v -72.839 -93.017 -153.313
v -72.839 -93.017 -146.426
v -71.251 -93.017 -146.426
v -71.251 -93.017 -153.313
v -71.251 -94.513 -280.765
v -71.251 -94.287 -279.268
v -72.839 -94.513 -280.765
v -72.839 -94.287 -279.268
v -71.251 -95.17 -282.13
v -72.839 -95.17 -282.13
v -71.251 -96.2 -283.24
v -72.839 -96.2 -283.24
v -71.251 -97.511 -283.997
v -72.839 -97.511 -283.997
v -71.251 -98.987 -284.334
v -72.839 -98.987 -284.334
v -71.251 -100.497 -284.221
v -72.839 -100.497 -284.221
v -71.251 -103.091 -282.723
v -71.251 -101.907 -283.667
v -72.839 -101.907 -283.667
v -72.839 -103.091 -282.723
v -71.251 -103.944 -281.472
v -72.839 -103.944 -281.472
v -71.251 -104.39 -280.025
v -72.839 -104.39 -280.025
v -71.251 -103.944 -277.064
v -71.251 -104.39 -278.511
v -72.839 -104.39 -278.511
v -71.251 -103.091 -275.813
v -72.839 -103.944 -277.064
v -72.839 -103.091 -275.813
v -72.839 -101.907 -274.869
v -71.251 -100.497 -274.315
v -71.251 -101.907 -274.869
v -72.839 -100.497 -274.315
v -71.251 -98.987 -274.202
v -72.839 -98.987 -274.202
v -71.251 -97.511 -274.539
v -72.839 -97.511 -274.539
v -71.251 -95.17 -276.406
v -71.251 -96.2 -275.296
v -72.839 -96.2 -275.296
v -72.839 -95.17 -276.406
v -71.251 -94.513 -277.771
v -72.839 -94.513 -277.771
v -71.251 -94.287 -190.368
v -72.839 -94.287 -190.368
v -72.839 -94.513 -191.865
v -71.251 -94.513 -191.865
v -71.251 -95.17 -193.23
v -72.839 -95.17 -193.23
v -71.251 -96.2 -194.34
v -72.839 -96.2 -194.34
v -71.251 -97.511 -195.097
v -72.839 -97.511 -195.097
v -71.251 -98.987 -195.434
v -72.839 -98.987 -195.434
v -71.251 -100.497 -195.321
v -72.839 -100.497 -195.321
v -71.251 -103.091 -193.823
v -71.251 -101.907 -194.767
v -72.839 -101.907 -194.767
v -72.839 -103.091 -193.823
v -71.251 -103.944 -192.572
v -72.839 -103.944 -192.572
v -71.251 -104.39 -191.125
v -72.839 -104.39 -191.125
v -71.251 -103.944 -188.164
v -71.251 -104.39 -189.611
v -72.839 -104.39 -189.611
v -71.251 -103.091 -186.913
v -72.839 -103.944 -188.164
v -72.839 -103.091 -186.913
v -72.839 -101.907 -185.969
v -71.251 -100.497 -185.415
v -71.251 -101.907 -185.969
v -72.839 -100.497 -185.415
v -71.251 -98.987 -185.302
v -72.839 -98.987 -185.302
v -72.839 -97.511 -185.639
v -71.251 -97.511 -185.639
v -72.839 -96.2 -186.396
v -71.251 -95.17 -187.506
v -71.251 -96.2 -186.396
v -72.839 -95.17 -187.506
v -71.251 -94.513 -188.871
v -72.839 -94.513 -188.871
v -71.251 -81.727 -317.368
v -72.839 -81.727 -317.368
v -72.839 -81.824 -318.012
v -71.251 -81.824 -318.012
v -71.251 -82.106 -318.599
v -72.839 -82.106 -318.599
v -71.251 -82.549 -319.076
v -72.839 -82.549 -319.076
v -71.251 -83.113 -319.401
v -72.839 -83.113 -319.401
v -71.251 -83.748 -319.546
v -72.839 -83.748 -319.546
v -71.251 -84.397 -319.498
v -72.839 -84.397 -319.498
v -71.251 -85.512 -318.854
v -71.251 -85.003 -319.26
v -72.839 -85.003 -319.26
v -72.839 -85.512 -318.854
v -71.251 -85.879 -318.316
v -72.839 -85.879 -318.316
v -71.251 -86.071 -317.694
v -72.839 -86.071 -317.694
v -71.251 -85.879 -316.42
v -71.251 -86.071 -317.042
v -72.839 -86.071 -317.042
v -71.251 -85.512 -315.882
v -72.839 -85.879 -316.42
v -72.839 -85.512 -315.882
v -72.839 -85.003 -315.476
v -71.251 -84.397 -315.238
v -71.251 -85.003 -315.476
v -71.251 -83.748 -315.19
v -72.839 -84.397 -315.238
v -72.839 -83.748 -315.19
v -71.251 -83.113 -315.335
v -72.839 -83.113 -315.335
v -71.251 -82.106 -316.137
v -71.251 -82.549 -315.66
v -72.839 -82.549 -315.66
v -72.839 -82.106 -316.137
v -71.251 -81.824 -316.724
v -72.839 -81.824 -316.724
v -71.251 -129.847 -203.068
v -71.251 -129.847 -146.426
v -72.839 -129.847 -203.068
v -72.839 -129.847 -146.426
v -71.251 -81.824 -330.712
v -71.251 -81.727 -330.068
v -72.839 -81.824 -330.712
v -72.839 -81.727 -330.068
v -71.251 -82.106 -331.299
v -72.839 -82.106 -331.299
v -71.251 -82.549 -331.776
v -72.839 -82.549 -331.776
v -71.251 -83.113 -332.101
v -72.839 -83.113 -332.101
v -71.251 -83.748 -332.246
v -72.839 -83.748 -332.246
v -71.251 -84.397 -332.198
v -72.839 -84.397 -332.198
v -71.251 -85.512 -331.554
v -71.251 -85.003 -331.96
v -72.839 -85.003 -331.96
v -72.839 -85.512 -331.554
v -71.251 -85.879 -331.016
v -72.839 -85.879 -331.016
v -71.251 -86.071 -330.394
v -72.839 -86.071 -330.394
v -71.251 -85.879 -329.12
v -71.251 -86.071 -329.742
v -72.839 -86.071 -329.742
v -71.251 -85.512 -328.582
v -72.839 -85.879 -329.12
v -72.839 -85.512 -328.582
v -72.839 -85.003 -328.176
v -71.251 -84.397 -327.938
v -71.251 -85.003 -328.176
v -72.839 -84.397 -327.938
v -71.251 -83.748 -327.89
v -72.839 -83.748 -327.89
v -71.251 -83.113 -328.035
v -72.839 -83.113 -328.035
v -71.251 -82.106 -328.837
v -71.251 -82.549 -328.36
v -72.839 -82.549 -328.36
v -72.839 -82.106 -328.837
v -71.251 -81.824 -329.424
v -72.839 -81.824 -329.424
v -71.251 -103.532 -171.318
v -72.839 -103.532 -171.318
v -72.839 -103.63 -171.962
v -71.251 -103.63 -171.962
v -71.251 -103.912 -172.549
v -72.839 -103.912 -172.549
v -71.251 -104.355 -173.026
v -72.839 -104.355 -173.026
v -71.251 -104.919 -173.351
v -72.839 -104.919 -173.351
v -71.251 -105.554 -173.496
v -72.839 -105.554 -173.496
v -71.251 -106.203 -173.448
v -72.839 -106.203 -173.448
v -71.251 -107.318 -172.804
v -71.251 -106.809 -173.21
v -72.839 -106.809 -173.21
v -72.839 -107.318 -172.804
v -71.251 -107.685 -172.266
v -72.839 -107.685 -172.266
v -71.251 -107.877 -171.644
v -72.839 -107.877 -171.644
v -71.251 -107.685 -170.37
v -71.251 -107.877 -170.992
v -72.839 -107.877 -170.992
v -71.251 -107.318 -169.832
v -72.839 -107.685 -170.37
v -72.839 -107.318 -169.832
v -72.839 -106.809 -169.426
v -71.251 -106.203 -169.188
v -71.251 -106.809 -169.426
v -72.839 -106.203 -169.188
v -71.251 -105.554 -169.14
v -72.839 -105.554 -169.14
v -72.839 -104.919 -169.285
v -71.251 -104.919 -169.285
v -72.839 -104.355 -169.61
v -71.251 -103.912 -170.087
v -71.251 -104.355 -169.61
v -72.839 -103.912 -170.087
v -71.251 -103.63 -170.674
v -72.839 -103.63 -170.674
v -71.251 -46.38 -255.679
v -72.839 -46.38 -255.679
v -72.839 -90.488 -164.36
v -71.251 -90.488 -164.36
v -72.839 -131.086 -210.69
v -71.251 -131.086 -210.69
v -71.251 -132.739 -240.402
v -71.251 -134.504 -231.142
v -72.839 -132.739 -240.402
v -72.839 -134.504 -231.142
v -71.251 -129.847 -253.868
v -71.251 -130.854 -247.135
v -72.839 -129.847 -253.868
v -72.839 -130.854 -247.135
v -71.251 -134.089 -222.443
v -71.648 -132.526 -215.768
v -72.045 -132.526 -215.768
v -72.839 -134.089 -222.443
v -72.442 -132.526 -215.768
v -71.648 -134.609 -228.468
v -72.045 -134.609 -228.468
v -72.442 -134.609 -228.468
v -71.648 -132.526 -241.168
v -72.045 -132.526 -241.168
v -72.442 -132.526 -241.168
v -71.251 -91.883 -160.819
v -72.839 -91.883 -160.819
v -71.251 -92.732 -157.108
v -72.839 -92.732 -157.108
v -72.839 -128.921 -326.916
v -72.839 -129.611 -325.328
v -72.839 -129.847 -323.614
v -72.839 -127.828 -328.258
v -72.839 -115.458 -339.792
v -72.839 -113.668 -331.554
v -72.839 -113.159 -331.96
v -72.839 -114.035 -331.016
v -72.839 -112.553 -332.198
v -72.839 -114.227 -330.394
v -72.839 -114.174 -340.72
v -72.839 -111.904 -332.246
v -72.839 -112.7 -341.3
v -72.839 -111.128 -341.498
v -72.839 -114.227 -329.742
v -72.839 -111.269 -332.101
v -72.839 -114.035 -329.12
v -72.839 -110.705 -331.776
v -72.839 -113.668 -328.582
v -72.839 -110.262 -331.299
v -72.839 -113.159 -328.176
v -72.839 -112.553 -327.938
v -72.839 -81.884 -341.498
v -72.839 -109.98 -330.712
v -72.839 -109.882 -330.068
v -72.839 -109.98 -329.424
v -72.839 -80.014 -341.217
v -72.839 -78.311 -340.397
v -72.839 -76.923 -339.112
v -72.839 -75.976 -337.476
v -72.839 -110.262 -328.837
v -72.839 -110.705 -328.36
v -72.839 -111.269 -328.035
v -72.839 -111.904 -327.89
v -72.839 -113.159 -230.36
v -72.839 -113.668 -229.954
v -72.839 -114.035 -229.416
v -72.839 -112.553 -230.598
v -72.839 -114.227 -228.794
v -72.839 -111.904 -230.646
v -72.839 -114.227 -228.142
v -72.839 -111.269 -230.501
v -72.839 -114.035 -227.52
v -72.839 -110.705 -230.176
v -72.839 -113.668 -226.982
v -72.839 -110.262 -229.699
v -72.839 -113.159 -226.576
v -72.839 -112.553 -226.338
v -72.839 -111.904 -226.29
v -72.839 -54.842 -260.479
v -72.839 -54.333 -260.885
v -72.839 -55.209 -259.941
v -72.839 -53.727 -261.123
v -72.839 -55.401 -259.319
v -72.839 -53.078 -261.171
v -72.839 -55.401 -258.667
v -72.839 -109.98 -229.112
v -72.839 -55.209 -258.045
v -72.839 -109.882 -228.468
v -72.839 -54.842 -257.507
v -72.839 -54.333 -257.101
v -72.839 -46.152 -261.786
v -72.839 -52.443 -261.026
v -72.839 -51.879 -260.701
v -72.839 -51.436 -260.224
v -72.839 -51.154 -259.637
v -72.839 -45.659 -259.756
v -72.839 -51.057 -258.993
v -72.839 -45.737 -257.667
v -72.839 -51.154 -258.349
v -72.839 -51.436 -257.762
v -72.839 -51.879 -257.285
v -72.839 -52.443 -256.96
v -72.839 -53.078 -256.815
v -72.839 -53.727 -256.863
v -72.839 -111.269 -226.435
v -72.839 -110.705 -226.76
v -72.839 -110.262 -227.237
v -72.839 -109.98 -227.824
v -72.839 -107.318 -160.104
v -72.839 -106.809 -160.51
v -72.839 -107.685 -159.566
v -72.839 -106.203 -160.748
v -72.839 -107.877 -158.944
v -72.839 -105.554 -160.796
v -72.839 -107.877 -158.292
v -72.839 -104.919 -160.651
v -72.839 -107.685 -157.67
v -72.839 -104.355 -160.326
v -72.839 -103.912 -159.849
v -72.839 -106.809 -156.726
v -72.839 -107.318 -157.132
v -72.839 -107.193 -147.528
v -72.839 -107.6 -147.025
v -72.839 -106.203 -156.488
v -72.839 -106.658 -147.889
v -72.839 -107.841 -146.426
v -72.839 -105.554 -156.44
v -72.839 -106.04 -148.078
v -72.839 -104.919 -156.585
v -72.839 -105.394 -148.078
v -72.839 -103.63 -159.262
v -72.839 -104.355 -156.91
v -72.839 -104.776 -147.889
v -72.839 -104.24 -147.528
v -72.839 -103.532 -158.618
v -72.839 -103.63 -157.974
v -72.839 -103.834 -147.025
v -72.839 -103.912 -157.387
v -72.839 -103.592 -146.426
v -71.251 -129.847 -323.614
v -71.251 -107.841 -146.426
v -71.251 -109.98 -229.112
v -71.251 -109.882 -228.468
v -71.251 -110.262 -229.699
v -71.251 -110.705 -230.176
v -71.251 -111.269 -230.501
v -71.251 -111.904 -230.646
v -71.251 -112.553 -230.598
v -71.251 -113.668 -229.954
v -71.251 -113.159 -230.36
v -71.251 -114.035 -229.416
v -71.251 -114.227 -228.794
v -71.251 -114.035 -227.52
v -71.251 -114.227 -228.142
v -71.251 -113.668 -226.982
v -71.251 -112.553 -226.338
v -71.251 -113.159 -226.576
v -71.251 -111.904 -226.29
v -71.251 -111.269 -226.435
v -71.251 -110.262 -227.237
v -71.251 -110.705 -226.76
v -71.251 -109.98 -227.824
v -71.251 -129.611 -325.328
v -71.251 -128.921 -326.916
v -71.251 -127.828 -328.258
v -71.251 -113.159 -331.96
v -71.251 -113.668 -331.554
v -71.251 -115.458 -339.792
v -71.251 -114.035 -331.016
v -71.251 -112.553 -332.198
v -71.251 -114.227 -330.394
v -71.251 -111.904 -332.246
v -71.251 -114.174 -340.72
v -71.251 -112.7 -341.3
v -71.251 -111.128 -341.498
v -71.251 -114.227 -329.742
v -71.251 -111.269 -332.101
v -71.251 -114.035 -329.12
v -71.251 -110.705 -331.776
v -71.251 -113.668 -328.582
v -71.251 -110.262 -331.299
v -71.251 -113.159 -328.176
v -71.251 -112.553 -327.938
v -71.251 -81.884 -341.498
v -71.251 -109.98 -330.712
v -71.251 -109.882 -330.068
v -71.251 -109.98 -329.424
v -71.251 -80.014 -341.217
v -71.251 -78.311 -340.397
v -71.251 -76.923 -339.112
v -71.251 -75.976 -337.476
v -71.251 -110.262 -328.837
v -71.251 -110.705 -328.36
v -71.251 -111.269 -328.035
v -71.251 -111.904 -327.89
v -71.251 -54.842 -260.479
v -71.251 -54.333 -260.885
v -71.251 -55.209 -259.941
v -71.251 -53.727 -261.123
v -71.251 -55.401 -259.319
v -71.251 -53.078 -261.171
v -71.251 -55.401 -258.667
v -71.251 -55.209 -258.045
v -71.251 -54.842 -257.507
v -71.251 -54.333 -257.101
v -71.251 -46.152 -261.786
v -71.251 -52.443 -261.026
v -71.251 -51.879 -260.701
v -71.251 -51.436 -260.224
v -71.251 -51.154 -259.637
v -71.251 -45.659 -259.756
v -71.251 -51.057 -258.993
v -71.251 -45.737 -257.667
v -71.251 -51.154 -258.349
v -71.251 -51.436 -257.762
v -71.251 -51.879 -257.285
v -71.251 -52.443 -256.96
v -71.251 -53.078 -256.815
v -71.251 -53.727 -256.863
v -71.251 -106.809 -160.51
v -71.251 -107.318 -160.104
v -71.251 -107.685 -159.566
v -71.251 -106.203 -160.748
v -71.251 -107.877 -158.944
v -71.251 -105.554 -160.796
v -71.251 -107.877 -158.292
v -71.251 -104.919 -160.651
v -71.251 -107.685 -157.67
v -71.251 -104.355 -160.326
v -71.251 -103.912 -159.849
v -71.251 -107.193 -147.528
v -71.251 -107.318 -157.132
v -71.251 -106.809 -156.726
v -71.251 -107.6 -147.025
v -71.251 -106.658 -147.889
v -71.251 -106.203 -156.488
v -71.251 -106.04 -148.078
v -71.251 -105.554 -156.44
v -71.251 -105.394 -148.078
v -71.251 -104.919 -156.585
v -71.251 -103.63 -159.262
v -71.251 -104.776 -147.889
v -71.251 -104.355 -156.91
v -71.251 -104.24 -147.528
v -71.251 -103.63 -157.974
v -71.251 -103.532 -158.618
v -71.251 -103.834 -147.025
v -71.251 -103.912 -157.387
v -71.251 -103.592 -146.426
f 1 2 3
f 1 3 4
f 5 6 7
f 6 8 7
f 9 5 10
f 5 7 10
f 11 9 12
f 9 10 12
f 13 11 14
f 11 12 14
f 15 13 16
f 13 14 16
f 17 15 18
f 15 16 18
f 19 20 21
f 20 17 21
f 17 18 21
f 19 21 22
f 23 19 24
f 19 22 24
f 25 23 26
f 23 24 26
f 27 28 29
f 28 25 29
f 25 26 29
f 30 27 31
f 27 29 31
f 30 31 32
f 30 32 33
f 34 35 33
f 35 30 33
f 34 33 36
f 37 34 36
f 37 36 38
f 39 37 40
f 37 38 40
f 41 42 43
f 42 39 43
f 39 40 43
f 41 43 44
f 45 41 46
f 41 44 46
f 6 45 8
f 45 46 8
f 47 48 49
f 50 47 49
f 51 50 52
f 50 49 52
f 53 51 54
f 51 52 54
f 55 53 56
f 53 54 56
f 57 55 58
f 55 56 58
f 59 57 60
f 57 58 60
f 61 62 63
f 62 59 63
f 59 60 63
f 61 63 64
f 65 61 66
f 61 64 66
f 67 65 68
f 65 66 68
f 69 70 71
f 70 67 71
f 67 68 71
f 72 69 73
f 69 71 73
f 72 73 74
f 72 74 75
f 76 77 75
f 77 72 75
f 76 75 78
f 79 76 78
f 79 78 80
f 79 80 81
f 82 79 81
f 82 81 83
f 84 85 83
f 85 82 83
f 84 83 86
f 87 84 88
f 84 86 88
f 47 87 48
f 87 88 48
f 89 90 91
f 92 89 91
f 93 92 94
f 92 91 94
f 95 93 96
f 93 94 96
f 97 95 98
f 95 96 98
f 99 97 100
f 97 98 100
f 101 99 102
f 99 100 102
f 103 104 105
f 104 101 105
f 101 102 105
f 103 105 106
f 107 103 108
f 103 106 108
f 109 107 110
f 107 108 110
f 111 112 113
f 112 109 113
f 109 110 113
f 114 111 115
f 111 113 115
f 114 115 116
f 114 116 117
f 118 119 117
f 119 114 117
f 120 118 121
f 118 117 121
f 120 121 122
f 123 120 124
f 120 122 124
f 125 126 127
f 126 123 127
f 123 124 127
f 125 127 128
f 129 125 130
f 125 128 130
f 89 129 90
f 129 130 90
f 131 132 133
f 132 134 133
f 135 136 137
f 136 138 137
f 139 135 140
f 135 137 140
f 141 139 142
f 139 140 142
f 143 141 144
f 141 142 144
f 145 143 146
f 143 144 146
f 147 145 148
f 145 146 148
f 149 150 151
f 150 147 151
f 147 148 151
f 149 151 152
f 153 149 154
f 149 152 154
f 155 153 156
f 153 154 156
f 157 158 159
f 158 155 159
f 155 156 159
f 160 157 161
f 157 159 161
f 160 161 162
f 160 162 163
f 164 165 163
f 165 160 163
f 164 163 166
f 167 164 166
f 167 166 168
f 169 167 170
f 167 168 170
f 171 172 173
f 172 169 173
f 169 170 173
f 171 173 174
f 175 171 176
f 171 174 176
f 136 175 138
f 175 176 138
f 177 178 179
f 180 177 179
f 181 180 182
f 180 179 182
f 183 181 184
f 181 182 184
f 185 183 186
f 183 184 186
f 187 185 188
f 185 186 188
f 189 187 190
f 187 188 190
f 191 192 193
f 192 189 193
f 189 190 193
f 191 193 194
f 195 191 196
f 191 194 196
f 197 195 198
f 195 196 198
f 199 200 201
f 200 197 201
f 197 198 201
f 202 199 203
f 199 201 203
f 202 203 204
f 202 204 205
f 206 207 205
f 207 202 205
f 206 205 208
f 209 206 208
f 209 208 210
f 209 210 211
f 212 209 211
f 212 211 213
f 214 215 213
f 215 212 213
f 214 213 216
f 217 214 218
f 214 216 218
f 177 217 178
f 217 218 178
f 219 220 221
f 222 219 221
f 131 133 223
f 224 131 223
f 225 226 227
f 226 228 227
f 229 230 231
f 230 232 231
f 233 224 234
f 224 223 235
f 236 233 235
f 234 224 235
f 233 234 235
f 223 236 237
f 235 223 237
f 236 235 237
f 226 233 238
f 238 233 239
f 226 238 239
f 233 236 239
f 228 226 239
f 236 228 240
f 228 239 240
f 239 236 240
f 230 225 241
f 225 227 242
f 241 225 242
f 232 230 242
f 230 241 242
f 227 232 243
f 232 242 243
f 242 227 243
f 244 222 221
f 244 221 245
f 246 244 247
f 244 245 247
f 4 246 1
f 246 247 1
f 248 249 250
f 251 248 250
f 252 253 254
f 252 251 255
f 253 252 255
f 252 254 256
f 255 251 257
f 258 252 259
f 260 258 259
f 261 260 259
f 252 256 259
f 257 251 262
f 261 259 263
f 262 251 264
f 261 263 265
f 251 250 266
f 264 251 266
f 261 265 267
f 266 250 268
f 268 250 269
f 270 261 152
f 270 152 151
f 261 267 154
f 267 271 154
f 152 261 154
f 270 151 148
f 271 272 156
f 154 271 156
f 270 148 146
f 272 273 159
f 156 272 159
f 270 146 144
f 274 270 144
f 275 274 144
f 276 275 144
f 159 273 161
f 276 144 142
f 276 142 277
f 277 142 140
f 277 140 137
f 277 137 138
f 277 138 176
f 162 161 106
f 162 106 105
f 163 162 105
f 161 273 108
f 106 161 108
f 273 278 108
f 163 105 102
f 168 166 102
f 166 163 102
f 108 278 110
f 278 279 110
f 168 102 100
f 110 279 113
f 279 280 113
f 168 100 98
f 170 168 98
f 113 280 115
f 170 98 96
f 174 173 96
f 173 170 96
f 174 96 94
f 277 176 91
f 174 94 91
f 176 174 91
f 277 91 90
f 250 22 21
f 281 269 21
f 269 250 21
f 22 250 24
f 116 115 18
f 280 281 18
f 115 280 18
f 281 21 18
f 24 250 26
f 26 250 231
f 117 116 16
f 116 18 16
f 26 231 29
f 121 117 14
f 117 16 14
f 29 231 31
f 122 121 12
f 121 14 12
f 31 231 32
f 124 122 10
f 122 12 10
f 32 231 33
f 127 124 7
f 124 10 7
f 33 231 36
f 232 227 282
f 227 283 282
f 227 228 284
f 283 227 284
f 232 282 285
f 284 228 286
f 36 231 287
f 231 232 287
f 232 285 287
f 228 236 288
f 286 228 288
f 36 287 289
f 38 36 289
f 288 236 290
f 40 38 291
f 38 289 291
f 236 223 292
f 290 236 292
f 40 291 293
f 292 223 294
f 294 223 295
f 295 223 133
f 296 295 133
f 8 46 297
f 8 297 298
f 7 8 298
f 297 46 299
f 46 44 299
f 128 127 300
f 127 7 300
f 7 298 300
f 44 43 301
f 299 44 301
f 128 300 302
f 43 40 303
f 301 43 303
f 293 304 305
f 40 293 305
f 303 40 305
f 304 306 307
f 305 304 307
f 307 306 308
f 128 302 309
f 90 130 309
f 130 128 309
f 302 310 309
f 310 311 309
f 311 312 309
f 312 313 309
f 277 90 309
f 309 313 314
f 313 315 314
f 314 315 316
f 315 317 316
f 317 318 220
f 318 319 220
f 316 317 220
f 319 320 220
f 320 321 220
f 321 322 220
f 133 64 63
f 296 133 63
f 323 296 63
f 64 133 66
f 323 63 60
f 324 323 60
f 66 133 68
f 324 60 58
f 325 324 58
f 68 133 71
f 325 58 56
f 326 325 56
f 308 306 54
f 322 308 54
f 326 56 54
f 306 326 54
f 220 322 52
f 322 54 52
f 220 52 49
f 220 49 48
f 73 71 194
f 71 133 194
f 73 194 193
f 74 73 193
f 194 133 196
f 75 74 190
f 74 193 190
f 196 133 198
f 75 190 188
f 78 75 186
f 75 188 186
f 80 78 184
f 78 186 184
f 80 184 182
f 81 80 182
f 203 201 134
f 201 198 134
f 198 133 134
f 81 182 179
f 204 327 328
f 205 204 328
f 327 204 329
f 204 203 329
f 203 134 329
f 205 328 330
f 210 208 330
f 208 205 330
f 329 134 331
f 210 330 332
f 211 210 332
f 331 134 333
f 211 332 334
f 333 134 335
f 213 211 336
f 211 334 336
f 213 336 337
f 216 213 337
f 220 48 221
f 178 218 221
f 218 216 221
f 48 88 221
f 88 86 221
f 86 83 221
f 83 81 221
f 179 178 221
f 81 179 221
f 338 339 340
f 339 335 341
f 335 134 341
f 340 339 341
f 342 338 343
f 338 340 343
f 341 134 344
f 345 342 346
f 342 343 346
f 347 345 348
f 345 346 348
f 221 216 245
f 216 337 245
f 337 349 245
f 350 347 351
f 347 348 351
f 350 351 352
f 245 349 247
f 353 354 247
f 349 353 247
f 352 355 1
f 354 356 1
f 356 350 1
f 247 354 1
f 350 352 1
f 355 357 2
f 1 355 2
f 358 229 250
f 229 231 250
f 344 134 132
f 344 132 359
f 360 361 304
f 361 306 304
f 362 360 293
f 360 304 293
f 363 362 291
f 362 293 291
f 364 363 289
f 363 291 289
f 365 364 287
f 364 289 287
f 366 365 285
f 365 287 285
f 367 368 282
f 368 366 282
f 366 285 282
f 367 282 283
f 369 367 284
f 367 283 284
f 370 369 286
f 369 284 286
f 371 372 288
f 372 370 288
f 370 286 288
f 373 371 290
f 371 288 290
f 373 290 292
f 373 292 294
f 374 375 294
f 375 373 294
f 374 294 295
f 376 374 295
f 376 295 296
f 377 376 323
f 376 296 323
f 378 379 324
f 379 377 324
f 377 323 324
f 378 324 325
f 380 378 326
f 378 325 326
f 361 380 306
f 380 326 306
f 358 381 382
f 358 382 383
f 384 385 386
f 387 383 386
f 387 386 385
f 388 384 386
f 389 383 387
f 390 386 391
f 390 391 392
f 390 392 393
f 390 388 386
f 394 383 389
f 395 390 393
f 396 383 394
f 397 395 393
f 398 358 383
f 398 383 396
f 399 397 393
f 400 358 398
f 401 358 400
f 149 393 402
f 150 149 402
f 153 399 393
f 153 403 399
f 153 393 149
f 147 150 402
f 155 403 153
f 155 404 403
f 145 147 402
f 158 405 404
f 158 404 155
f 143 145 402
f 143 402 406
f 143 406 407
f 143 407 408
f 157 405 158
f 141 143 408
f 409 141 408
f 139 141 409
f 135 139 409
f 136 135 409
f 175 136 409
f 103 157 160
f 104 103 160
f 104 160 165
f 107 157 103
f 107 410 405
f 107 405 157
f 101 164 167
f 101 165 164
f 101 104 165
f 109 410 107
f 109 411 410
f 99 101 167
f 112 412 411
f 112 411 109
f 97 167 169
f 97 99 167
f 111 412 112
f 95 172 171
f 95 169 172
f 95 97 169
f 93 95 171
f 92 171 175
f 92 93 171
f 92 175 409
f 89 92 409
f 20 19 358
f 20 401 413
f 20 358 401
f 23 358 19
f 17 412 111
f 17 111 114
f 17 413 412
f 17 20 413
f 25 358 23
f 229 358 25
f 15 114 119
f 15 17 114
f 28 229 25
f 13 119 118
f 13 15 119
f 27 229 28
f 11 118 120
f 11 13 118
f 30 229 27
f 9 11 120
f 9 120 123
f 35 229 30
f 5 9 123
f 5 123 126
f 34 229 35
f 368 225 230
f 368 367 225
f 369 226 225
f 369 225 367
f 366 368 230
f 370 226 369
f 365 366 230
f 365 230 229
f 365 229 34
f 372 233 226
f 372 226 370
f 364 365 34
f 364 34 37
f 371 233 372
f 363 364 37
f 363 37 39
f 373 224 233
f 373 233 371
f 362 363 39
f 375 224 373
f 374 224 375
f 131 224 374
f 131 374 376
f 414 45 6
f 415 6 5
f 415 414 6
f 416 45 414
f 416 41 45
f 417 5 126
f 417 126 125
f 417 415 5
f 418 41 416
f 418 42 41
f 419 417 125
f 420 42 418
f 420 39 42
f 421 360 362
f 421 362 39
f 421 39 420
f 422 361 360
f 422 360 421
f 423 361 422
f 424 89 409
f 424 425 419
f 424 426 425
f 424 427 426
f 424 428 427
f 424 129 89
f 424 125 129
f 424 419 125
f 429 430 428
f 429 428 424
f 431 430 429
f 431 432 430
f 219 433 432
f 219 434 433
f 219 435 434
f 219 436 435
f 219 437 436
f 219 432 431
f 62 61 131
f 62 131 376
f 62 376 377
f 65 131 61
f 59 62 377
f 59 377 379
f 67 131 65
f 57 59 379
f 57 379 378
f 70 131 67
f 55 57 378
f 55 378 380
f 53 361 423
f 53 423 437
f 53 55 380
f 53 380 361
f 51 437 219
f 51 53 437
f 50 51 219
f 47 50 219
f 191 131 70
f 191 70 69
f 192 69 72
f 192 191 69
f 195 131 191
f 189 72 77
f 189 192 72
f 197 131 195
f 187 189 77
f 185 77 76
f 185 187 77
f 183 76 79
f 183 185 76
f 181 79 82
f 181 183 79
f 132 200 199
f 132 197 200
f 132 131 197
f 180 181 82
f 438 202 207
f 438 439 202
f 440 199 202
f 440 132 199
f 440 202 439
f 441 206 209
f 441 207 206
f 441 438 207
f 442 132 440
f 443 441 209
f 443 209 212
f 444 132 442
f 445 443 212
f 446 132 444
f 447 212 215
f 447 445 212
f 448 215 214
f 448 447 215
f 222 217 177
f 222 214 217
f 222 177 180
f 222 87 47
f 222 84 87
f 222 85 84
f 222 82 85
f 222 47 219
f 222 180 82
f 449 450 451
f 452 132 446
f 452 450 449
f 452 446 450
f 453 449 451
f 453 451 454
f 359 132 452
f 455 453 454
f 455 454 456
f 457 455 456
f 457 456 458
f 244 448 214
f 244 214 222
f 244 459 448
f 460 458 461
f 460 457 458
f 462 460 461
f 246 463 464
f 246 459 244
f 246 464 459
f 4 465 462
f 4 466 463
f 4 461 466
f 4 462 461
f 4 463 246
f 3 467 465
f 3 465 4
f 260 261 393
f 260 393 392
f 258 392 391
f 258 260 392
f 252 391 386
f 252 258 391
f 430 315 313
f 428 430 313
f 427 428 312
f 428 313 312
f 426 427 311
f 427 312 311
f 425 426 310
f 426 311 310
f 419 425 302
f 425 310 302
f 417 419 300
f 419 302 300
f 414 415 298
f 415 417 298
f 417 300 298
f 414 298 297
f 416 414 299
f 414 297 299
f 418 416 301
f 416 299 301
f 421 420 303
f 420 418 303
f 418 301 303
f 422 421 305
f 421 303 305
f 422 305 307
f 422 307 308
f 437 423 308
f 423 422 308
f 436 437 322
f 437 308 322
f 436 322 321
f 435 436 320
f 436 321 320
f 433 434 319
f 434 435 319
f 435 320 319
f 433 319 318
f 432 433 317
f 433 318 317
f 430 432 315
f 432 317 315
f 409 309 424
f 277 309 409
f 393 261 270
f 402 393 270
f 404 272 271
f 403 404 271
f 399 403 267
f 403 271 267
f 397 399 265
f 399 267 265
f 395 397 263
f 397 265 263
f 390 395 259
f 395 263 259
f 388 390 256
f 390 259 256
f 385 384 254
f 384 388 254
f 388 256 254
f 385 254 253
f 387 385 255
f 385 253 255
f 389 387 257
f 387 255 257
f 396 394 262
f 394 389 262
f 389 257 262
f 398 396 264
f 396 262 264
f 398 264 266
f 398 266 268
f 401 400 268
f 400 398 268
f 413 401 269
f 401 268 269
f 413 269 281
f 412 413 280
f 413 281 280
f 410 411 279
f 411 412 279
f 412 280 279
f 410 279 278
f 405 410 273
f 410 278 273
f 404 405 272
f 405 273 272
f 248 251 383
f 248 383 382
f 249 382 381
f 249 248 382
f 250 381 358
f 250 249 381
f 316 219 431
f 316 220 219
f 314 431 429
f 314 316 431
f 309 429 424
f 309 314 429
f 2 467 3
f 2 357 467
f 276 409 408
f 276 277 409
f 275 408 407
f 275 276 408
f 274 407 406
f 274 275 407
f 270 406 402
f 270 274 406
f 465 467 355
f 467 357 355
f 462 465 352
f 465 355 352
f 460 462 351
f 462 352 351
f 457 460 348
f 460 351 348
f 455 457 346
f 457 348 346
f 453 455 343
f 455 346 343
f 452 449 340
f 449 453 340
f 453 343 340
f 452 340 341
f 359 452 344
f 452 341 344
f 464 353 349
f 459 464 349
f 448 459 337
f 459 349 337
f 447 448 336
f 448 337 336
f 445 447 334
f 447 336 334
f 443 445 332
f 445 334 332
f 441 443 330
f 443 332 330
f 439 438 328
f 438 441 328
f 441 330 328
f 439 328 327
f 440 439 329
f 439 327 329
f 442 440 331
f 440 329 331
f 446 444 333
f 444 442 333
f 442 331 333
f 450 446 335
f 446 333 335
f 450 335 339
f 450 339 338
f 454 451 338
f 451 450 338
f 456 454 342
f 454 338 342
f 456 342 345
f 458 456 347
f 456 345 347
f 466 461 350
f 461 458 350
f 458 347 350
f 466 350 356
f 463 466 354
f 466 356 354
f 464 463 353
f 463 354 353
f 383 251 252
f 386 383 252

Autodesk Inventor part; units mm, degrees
ref_plane "YZ Plane" through (0, 0, 0) normal (1, 0, 0) x (0, 1, 0)
ref_plane "XZ Plane" through (0, 0, 0) normal (0, 1, 0) x (-1, 0, 0)
ref_plane "XY Plane" through (0, 0, 0) normal (0, 0, 1) x (1, 0, 0)
ref_plane "Work Plane1" through (-72.8386, -105.7169, -152.268) normal (1, 0, 0) x (0, 1, 0)
sketch "Sketch1" plane through (-72.8386, -105.7169, -152.268) normal (1, 0, 0) x (0, 1, 0)
  line L0 (-41.2196, 6.35) -> (64.7019, 6.35)
  circle A0 centre (0, 6.35) radius 2.1844
  line L1 (-12.7, -5.2578) -> (-12.7, 56.2102) projected
  line L2 (-24.13, 6.35) -> (-24.13, -171.3455)
  line L3 (-22.1107, -175.9896) -> (-9.7415, -187.5241)
  line L4 (-5.4108, -189.23) -> (23.8328, -189.23)
  circle A1 centre (52.4757, -106.725) radius 2.1844 projected
  line L5 (12.7, 56.2102) -> (12.7, -5.2578) projected
  circle A2 centre (52.4757, -106.725) radius 7.62
  line L6 (2.3114, -184.15) -> (10.3188, -184.15) projected
  line L7 (-12.7, -184.15) -> (-12.7, -134.2898) projected
  line L8 (59.5652, -109.5185) -> (29.7407, -185.2079)
  line L9 (-24.13, 5.842) -> (67.0388, 5.842)
  line L10 (59.3372, -103.4107) -> (15.2284, -12.0924)
  line L11 (12.7, -1.0449) -> (12.7, 5.842)
  circle A3 centre (21.8059, -177.8) radius 2.1844 projected
  circle A4 centre (21.8059, -165.1) radius 2.1844 projected
  circle A5 centre (-6.35, -76.2) radius 2.1844 projected
  circle A6 centre (-6.35, -76.2) radius 20.32
  line L12 (-24.13, -50.8) -> (-24.13, -63.5) construction
  line L13 (-24.13, -63.5) -> (-36.83, -76.2) construction
  line L14 (-36.83, -76.2) -> (-24.13, -88.9) construction
  line L15 (-24.13, -88.9) -> (-24.13, -101.6) construction
  spline S0 degree 4 poles (-24.13, -50.8) (-24.13, -63.5) (-36.83, -76.2) (-24.13, -88.9) (-24.13, -101.6) knots 1 1 1 1 1 2 2 2 2 2
  arc A7 (12.7, -1.0449) -> (15.2284, -12.0924) centre (38.1, -1.0449) ccw
  arc A8 (23.8328, -189.23) -> (29.7407, -185.2079) centre (23.8328, -182.88) ccw
  arc A9 (-9.7415, -187.5241) -> (-5.4108, -189.23) centre (-5.4108, -182.88) ccw
  arc A10 (-24.13, -171.3455) -> (-22.1107, -175.9896) centre (-17.78, -171.3455) ccw
  circle A11 centre (6.35, -38.1) radius 2.1844
  circle A12 centre (6.35, -38.1) radius 5.08
  circle A13 centre (6.35, -127) radius 2.1844
  circle A14 centre (6.35, -127) radius 5.08
  circle A15 centre (0, -82.55) radius 2.1844
  line L16 (10.3187, 184.15) -> (-10.3187, 184.15) projected
  circle A16 centre (6.35, -25.4) radius 2.1844 projected
  circle A17 centre (6.35, -12.7) radius 2.1844 projected
  circle A18 centre (6.35, 0) radius 2.1844 projected
  circle A19 centre (-6.35, -177.8) radius 2.1844 projected
  circle A20 centre (0, -6.35) radius 2.1844
  circle A21 centre (0, -19.05) radius 2.1844
  point P0 (105.7169, 152.268)
  point P1 (-7.9121, -189.23)
  point P2 (28.1559, -189.23)
  point P3 (12.7, -6.858)
  point P4 (12.7, -1.0449)
  point P5 (12.7, 5.842)
  point P6 (2.1245, 5.842)
  point P7 (-2.1245, 5.842)
  point P8 (-24.13, -66.3626)
  point P9 (-24.13, -86.0374)
  dimension "d0" = 15.24
  dimension "d1" = 5.08
  dimension "d3" = 11.43
  dimension "d4" = 133
  dimension "d5" = 40.64
  dimension "d6" = 6.35
  dimension "d7" = 36.068
  dimension "d8" = 0.508
  dimension "d9" = 12.7
  dimension "d10" = 12.7
  dimension "d11" = 12.7
  dimension "d12" = 12.7
  dimension "d13" = 12.7
  dimension "d14" = 12.7
  dimension "d15" = 25.4
  dimension "d16" = 6.35
  dimension "d17" = 10.16
  dimension "d18" = 10.16
  dimension "d21" = 12.7
  dimension "d22" = 12.7
  dimension "d23" = 4.3688
  dimension "d24" = 4.3688
extrude "Extrusion1" add sketch "Sketch1" along normal blind 1.5875 contours L9 A0 L5 A7 L10 A2 L8 A8 L4 A9 L3 A10 L2 A6 | L2 A6 S0 | A6 L2 | L2 A6 | A2 | A15 | A16 | A17 | A18
